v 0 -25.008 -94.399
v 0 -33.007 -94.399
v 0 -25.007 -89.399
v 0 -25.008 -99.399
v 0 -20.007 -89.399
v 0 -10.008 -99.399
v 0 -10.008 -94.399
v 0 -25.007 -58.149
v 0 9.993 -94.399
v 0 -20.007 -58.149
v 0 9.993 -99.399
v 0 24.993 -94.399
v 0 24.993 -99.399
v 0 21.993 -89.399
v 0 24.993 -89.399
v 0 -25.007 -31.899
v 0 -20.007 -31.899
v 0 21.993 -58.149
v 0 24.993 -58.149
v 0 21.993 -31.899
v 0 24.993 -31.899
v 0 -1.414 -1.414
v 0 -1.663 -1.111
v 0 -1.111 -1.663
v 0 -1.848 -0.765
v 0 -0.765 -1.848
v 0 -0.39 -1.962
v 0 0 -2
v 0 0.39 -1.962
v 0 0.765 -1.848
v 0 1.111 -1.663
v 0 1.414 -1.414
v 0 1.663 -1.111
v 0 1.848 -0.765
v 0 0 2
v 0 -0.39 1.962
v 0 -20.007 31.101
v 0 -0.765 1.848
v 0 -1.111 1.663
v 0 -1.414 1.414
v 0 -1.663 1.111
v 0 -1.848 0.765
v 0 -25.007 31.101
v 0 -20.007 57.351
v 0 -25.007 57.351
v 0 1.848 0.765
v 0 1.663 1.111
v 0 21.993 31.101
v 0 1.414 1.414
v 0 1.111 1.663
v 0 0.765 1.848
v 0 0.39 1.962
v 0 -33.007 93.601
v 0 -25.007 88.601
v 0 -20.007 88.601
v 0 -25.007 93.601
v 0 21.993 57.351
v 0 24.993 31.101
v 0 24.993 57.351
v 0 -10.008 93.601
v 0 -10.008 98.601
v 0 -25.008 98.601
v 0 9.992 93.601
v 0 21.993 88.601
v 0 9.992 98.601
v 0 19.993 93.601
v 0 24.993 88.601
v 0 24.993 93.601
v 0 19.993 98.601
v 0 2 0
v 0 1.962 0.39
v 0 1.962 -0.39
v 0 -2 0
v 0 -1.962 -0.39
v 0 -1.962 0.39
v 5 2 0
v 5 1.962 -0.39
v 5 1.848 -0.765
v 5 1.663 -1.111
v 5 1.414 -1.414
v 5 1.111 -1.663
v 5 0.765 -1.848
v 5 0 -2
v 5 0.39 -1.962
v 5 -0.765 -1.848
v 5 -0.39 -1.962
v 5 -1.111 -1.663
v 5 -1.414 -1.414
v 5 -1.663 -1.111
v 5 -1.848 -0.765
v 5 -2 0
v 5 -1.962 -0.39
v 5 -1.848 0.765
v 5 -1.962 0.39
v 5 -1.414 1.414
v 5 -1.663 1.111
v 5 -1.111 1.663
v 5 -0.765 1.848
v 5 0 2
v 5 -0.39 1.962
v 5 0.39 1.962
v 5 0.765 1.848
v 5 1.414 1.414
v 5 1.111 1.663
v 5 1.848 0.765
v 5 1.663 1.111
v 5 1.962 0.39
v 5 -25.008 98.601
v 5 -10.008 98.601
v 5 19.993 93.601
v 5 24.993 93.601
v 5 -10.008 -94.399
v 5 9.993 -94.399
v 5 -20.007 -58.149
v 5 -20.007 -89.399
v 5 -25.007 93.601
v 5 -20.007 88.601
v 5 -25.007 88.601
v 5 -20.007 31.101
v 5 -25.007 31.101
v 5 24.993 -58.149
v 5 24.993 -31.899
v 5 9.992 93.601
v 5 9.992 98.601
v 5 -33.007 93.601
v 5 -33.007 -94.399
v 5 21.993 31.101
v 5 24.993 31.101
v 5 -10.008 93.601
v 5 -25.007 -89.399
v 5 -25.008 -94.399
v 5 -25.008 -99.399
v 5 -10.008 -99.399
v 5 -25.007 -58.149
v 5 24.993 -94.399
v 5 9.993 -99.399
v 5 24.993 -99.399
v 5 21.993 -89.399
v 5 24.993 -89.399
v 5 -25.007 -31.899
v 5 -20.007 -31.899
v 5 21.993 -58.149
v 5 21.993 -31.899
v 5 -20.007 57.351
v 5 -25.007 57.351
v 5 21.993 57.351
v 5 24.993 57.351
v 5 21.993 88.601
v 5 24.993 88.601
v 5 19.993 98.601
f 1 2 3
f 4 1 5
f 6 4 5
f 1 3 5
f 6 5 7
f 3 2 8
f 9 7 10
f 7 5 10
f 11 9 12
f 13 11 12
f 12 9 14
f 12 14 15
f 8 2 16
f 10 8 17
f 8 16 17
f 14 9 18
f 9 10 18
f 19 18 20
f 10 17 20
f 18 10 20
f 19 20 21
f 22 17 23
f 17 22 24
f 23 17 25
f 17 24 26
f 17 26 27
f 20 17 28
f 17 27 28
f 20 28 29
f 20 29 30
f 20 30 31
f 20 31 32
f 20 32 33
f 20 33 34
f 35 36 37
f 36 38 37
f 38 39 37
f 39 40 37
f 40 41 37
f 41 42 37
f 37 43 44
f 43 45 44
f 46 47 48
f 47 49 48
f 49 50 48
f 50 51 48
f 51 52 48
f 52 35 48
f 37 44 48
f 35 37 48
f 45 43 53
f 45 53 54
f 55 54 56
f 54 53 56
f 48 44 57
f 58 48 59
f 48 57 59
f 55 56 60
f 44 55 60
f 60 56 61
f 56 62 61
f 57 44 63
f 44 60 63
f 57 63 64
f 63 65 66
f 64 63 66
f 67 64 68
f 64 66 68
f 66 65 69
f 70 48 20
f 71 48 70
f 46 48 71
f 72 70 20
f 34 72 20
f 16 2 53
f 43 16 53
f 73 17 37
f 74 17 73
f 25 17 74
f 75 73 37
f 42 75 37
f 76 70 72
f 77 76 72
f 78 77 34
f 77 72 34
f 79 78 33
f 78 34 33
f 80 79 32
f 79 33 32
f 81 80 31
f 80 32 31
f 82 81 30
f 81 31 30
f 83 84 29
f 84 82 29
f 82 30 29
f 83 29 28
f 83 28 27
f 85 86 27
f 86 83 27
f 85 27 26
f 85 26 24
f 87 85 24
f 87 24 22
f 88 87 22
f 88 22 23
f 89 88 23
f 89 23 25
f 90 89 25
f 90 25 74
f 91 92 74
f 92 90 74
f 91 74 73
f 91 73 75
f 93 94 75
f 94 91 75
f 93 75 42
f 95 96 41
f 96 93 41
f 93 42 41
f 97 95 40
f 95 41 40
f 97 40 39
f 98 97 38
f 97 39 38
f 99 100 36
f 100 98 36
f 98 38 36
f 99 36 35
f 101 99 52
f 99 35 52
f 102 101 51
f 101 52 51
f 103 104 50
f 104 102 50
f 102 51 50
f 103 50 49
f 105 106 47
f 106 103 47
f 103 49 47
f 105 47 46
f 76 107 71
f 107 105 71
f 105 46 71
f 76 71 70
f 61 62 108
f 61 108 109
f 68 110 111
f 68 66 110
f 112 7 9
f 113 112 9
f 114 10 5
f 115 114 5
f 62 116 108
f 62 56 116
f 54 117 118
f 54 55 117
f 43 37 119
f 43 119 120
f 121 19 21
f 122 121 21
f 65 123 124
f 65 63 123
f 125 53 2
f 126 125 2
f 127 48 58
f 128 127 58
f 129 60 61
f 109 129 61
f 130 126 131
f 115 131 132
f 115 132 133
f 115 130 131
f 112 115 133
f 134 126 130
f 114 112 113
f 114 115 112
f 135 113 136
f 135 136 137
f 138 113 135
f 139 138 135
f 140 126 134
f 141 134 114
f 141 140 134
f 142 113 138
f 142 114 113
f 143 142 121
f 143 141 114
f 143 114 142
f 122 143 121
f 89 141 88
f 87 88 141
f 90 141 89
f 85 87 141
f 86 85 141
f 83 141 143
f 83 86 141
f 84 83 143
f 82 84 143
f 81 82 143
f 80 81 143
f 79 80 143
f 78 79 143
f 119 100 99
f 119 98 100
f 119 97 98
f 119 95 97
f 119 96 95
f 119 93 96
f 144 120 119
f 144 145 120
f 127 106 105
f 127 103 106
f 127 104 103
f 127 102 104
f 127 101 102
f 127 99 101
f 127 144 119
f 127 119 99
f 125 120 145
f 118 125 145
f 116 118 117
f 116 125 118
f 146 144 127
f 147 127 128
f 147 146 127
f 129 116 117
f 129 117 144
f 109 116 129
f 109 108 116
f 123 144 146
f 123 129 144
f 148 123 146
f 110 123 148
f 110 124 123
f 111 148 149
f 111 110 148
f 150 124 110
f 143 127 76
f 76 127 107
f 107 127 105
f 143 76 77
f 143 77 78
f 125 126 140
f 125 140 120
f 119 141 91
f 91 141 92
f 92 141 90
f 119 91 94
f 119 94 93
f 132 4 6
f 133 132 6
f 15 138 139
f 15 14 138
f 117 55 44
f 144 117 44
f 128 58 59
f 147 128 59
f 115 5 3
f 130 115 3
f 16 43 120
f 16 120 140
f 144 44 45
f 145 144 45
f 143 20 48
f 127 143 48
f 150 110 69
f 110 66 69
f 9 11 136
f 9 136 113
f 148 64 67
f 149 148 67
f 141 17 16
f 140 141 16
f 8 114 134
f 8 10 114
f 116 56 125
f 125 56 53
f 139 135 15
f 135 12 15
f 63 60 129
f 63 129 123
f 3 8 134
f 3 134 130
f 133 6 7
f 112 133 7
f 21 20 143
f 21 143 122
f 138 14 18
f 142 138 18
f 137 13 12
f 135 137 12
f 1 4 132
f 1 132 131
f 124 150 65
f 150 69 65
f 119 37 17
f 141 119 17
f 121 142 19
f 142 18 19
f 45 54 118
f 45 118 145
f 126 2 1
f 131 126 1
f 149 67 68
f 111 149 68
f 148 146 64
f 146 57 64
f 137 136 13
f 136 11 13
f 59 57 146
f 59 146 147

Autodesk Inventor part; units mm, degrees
ref_plane "YZ Plane" through (0, 0, 0) normal (1, 0, 0) x (0, 1, 0)
ref_plane "XZ Plane" through (0, 0, 0) normal (0, 1, 0) x (-1, 0, 0)
ref_plane "XY Plane" through (0, 0, 0) normal (0, 0, 1) x (1, 0, 0)
sketch "Sketch1" plane through (0, 0, 0) normal (1, 0, 0) x (0, 1, 0)
  circle A0 centre (0, 0) radius 2
  line L0 (-20.007, 88.601) -> (-20.007, 57.351) projected
  line L1 (-20.007, 57.351) -> (-25.007, 57.351) projected
  line L2 (-25.007, 88.601) -> (-25.007, 57.351) projected
  line L3 (-20.007, 88.601) -> (-25.007, 88.601) projected
  line L4 (-20.007, 31.101) -> (-20.007, -31.899) projected
  line L5 (-20.007, -31.899) -> (-25.007, -31.899) projected
  line L6 (-25.007, 31.101) -> (-25.007, -31.899) projected
  line L7 (-20.007, 31.101) -> (-25.007, 31.101) projected
  line L8 (-20.007, -58.149) -> (-20.007, -89.399) projected
  line L9 (-20.007, -89.399) -> (-25.007, -89.399) projected
  line L10 (-25.007, -58.149) -> (-25.007, -89.399) projected
  line L11 (-20.007, -58.149) -> (-25.007, -58.149) projected
  line L12 (19.993, 93.601) -> (19.993, 98.601)
  line L13 (19.993, 98.601) -> (9.9915, 98.601) projected
  line L14 (9.9915, 93.601) -> (9.9915, 98.601) projected
  line L15 (-10.0085, 93.601) -> (-10.0085, 98.601) projected
  line L16 (-25.0077, 98.601) -> (-10.0085, 98.601) projected
  line L17 (-25.007, 93.601) -> (-25.007, 98.601) projected
  line L18 (-25.007, 93.601) -> (-33.007, 93.601)
  line L19 (-33.007, 93.601) -> (-33.007, -94.399)
  line L20 (-10.0085, 93.601) -> (9.9915, 93.601)
  line L21 (24.993, -99.399) -> (24.993, -94.399)
  line L22 (9.993, -99.399) -> (24.993, -99.399) projected
  line L23 (9.993, -99.399) -> (9.993, -94.399) projected
  line L24 (-10.0077, -94.399) -> (9.993, -94.399) projected
  line L25 (-10.0077, -99.399) -> (-10.0077, -94.399) projected
  line L26 (-25.0077, -99.399) -> (-10.0077, -99.399) projected
  line L27 (-25.0077, -99.399) -> (-25.0077, -94.399) projected
  line L28 (-33.0079, -94.399) -> (-25.0077, -94.399) projected
  line L29 (19.993, 93.601) -> (24.993, 93.601)
  line L30 (24.993, -94.399) -> (24.993, -89.399)
  line L31 (21.993, -89.399) -> (24.993, -89.399)
  line L32 (21.993, -89.399) -> (21.993, -58.149)
  line L33 (21.993, -58.149) -> (24.993, -58.149)
  line L34 (24.993, -58.149) -> (24.993, -31.899)
  line L35 (21.993, -31.899) -> (24.993, -31.899)
  line L36 (21.993, -31.899) -> (21.993, 31.101)
  line L37 (21.993, 31.101) -> (24.993, 31.101)
  line L38 (24.993, 31.101) -> (24.993, 57.351)
  line L39 (21.993, 57.351) -> (24.993, 57.351)
  line L40 (21.993, 57.351) -> (21.993, 88.601)
  line L41 (21.993, 88.601) -> (24.993, 88.601)
  line L42 (24.993, 88.601) -> (24.993, 93.601)
  point P0 (-29.9123, 87.1698)
  dimension "d24" = 4
  dimension "d25" = 8
  dimension "d27" = 198
  dimension "d30" = 5
  dimension "d31" = 188
  dimension "d32" = 188
  dimension "d33" = 58
  dimension "d35" = 3
extrude "Extrusion1" add sketch "Sketch1" along normal blind 5
properties part number "case top sides" material "ABS Plastic"
